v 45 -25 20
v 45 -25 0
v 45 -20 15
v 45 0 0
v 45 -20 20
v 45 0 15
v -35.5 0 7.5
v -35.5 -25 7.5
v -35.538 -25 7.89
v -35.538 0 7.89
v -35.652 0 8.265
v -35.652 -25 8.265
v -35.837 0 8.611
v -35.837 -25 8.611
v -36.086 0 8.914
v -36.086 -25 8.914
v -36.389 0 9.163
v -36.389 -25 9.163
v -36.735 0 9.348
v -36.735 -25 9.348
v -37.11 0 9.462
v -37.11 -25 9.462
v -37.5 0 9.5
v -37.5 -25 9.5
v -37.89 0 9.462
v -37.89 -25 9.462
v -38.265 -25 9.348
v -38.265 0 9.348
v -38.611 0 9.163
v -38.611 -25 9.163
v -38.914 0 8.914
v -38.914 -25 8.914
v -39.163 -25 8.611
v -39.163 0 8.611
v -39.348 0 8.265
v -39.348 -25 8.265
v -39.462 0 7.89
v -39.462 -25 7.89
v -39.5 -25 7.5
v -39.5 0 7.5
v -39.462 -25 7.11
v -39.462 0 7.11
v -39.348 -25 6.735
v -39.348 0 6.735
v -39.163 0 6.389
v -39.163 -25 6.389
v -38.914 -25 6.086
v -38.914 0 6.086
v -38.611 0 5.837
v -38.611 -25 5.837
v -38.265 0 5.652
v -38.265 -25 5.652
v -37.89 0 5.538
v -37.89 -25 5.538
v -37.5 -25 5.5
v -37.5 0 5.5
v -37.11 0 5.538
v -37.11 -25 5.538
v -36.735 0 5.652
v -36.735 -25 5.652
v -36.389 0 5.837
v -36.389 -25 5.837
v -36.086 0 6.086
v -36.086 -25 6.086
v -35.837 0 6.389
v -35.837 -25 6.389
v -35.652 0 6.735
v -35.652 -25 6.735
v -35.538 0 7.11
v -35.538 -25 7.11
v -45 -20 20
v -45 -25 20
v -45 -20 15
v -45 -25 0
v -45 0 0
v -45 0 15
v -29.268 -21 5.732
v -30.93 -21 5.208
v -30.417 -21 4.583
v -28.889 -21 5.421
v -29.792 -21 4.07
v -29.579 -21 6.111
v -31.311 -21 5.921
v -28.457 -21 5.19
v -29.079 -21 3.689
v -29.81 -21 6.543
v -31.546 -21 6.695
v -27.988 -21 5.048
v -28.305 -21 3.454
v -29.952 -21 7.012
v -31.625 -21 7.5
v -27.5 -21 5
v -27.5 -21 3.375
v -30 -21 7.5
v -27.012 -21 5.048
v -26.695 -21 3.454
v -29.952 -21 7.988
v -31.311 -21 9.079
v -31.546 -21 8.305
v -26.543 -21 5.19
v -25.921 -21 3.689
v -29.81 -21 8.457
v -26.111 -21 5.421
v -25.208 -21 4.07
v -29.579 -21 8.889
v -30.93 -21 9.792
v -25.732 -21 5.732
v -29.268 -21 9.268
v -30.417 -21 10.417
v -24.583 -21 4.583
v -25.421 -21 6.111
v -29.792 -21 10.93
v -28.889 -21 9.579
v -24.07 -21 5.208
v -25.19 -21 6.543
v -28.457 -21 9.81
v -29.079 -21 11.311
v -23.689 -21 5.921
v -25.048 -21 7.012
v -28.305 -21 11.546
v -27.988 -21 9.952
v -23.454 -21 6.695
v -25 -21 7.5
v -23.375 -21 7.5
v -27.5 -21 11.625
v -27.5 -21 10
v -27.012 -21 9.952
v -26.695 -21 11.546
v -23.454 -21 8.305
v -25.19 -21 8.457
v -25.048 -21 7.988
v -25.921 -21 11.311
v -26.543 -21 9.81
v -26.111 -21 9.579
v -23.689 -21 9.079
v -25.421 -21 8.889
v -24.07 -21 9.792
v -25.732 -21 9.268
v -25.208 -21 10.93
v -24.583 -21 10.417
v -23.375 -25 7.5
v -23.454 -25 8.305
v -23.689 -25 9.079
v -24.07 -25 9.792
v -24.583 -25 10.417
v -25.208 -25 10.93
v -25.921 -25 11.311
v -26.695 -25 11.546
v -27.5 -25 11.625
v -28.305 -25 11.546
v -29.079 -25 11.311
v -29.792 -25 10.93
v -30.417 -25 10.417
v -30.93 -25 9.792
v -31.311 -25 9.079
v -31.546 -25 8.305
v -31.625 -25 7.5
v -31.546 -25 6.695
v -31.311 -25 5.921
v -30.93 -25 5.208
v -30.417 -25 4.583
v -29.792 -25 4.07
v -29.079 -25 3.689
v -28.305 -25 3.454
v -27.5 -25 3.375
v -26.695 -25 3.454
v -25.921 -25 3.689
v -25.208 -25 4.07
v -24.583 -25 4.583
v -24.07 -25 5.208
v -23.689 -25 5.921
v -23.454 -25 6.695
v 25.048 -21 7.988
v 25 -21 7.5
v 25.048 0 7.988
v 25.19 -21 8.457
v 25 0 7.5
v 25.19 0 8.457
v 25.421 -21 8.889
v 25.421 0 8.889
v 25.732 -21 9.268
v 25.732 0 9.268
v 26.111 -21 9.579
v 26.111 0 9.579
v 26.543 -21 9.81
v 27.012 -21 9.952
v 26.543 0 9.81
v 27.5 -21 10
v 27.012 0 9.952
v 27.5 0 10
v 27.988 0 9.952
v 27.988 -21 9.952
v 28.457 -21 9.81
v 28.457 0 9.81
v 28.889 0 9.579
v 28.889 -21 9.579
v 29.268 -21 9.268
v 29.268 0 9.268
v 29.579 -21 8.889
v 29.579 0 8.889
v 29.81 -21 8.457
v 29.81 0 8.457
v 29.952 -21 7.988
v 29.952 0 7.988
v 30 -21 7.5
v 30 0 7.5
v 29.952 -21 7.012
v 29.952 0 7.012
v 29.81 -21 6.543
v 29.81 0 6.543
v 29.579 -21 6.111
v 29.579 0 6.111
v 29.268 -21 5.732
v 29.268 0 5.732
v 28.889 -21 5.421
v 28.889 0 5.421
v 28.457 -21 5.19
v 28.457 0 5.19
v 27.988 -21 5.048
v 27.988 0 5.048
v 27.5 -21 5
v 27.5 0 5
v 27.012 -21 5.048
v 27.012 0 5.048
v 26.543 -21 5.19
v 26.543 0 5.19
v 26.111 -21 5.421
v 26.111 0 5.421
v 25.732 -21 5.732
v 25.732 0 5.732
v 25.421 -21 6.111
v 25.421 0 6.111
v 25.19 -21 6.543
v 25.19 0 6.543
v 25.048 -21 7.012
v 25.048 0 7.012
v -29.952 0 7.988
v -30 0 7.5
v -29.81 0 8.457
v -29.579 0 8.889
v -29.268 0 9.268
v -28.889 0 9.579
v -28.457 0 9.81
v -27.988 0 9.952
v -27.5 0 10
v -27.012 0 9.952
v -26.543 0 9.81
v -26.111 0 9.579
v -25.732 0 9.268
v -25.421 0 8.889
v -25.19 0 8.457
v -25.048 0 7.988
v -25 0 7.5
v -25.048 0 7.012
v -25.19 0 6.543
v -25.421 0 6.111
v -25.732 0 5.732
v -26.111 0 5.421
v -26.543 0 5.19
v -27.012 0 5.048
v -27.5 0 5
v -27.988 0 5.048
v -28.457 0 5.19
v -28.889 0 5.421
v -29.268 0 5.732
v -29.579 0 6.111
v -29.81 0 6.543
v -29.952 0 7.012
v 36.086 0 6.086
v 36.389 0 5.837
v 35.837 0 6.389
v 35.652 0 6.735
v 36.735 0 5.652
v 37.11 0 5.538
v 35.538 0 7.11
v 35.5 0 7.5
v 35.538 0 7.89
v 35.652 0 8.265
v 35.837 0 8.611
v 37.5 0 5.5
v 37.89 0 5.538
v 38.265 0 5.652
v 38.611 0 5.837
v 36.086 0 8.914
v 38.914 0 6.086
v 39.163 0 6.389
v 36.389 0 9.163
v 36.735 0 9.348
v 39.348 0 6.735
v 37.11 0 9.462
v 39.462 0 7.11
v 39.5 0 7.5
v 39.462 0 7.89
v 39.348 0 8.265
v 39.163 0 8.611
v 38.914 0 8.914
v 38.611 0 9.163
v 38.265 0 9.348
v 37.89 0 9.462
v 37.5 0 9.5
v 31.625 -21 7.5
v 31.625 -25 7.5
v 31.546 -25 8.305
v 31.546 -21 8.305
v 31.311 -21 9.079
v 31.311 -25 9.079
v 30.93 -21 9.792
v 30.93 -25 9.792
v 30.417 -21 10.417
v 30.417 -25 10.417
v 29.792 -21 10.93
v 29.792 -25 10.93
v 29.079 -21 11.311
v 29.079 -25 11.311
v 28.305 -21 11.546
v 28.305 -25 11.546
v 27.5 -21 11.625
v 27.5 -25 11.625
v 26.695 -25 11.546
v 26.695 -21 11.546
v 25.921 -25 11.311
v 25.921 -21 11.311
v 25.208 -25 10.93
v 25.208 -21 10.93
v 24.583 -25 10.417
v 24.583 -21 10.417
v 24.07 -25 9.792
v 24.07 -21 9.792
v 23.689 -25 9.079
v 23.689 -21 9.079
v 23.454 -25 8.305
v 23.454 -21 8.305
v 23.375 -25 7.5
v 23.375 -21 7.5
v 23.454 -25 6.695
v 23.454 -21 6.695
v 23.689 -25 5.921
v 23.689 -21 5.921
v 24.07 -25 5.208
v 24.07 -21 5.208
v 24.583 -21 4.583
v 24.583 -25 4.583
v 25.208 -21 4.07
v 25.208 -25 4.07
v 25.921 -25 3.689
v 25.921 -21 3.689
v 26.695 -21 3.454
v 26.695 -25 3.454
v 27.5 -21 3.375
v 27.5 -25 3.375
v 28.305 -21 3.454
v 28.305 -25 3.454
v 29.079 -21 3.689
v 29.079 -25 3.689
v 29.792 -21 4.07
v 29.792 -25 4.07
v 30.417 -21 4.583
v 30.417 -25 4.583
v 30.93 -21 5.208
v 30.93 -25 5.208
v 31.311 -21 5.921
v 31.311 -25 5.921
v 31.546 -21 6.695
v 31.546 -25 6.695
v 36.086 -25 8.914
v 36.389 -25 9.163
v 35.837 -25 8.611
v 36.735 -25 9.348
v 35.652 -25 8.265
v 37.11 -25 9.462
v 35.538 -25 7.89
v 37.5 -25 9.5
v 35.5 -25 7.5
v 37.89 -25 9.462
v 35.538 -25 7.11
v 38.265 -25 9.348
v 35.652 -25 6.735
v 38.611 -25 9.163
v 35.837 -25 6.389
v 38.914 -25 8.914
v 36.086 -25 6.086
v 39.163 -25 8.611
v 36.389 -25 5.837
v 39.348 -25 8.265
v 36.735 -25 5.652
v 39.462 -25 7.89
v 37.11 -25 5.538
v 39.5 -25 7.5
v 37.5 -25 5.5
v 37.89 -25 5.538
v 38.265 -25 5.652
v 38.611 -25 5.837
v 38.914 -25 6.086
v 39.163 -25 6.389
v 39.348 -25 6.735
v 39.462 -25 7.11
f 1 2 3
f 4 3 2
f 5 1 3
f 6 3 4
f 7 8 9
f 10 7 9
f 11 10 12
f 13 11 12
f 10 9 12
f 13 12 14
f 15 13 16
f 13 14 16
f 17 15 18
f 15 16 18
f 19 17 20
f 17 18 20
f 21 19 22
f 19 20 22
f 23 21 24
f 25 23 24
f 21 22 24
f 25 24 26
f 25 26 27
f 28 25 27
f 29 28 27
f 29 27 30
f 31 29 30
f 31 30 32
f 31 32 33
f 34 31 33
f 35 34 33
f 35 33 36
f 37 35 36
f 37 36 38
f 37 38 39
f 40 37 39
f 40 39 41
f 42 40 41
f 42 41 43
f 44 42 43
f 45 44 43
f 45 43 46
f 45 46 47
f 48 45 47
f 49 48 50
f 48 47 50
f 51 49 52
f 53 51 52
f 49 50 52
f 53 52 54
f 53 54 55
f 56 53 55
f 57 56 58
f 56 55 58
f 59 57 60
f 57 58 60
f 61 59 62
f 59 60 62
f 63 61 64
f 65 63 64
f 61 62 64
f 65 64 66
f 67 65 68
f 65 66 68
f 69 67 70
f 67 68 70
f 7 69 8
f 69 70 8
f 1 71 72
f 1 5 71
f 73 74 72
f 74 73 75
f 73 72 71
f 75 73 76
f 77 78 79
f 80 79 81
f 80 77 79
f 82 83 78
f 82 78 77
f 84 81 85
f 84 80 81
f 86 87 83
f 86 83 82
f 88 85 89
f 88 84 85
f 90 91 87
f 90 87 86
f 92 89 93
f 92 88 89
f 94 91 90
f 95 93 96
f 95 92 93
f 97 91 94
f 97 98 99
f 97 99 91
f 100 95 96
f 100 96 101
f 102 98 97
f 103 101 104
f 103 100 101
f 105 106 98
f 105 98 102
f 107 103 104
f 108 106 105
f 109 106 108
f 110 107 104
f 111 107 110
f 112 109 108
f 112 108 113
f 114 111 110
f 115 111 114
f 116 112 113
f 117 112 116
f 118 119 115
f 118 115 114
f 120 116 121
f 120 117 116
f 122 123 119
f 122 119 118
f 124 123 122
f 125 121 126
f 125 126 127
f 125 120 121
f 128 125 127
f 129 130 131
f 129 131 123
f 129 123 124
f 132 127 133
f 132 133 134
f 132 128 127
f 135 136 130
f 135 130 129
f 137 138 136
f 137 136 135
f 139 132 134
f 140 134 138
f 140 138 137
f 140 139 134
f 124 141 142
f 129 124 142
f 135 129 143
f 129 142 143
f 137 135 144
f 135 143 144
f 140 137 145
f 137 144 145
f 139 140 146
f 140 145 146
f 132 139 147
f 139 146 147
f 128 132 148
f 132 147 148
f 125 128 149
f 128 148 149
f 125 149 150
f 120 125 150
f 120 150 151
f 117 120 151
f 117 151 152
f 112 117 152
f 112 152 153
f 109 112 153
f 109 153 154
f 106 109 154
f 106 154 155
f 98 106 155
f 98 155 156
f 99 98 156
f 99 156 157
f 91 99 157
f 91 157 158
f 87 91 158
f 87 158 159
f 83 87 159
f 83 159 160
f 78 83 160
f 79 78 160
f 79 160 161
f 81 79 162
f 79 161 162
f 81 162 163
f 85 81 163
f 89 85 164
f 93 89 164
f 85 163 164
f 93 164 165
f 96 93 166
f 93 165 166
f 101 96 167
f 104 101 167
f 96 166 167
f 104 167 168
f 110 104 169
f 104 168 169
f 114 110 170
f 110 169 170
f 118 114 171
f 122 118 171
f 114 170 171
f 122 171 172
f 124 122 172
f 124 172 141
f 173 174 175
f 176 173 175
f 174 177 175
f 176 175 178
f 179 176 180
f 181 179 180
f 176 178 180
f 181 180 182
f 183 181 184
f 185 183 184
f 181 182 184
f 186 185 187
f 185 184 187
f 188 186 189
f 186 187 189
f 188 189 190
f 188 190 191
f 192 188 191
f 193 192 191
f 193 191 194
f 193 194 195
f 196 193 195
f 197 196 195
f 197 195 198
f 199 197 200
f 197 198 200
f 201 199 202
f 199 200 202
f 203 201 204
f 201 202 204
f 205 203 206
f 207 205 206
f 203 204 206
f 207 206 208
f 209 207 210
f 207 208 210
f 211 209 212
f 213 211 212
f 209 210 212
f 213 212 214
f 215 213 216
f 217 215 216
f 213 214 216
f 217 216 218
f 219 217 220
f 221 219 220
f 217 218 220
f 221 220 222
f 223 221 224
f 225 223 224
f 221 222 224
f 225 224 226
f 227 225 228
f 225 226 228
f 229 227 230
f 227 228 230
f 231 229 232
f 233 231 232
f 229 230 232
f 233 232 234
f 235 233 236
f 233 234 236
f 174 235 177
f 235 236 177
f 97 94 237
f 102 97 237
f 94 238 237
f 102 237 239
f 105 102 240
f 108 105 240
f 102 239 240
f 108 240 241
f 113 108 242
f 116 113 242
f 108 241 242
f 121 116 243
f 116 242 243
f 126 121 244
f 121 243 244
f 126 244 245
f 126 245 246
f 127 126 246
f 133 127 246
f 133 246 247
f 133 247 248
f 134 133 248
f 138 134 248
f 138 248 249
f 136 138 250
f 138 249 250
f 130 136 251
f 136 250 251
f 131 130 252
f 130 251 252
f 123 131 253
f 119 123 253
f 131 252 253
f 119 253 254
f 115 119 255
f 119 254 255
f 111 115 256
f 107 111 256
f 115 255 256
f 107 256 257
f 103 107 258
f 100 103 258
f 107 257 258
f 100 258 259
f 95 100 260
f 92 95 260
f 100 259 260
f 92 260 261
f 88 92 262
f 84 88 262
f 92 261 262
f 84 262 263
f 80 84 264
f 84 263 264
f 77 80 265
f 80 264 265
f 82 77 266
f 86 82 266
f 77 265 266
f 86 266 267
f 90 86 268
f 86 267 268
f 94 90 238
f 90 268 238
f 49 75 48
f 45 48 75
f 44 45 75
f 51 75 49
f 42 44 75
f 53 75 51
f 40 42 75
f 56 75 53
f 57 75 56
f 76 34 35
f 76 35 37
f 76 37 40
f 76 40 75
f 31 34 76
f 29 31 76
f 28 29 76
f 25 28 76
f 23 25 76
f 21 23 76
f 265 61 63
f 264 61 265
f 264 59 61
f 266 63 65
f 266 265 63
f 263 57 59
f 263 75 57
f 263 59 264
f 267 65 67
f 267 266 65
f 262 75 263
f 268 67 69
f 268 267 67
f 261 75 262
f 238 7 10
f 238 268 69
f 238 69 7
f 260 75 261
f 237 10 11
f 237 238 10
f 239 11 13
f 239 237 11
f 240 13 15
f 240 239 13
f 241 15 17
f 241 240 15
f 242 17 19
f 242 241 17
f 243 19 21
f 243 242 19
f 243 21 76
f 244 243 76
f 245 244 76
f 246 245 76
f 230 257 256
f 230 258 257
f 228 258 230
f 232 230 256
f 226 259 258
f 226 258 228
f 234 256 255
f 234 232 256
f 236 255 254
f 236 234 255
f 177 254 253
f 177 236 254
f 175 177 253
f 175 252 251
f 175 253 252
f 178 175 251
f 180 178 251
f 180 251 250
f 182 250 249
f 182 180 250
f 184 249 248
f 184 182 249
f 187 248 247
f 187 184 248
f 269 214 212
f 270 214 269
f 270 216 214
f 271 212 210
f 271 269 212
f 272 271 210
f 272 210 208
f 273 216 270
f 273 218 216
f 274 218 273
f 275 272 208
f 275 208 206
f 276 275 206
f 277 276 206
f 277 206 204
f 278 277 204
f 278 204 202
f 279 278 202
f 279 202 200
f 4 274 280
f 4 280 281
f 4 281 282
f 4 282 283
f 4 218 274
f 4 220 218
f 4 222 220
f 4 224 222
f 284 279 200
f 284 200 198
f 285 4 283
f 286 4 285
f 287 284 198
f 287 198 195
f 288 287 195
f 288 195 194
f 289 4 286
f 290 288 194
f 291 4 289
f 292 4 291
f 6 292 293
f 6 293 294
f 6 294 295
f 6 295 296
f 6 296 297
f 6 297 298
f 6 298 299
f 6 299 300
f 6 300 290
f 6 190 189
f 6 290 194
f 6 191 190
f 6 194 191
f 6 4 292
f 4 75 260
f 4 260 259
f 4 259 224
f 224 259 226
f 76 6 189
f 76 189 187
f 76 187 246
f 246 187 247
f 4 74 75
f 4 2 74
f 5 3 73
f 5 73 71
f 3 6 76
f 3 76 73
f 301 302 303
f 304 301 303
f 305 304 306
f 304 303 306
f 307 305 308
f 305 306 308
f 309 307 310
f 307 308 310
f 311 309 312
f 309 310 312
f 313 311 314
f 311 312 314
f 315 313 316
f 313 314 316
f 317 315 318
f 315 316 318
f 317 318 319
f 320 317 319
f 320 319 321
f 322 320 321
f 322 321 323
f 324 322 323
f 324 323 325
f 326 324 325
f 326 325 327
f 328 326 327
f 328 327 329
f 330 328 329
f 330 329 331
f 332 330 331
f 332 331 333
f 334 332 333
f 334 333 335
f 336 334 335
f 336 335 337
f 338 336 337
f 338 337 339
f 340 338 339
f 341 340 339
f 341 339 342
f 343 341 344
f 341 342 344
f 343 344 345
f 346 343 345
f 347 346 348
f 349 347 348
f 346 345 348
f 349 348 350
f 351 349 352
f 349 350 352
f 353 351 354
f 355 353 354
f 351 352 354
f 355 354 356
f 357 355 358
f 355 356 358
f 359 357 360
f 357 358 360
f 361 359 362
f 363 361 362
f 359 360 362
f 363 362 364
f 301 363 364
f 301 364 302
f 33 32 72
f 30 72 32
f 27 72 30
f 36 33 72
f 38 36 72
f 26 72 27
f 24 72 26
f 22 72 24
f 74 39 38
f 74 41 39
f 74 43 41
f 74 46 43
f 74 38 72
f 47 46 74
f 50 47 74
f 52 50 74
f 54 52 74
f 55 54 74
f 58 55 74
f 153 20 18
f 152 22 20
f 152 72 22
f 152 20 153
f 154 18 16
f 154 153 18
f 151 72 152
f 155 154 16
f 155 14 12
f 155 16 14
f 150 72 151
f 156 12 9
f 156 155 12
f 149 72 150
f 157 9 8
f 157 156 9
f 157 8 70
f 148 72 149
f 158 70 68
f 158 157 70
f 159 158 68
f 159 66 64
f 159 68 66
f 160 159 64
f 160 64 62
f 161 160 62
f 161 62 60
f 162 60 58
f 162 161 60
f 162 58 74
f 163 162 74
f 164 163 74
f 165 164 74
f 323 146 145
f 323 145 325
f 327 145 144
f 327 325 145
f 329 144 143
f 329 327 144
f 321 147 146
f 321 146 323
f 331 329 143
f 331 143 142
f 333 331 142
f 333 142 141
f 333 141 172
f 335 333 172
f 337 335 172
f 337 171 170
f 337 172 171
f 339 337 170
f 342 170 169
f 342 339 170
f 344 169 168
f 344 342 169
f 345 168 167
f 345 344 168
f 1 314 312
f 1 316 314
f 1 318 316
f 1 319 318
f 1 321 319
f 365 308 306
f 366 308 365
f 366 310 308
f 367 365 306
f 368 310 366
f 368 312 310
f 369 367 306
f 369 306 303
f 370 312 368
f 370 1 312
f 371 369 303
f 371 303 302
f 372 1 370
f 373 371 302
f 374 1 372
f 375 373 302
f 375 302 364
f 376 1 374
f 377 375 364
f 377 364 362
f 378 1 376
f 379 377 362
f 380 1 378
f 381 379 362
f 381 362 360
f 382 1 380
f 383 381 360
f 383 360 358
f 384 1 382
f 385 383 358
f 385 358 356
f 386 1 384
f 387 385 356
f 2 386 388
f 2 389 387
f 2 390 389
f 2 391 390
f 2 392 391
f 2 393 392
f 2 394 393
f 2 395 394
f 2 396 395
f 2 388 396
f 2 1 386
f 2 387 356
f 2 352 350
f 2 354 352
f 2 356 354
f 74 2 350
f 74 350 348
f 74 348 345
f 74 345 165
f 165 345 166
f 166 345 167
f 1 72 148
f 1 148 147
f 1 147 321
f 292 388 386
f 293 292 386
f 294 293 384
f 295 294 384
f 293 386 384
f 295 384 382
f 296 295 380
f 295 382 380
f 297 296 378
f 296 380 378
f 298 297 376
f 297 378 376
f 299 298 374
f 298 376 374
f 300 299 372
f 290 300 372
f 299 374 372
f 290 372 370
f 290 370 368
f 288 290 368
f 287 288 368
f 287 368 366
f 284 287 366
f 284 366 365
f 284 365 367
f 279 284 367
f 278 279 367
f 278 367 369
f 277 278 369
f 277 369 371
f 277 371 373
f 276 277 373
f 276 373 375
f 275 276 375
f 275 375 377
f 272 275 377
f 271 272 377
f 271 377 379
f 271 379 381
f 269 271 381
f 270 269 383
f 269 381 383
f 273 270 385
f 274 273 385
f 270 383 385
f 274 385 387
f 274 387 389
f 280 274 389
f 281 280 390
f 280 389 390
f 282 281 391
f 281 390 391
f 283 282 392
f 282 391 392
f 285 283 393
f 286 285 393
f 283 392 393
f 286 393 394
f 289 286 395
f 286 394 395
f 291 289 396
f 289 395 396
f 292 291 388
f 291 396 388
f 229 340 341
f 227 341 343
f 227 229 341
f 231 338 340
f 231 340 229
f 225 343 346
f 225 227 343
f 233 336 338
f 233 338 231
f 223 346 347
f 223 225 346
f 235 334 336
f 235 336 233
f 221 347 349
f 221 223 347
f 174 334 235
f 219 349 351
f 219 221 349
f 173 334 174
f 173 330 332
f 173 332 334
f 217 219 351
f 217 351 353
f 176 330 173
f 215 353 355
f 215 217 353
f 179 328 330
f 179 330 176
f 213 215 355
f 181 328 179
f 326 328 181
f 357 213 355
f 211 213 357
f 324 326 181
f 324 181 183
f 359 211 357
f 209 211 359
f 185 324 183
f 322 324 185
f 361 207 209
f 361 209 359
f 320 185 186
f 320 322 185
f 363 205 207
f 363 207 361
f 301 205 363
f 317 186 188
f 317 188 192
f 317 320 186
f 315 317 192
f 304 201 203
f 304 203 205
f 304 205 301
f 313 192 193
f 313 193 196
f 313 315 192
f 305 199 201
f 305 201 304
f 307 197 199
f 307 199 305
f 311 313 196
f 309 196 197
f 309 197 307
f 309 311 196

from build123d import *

# Parameters (mm, degrees)
F1_DEPTH       = 45
F2_R           = 2
F3_DEPTH       = 25.001
F4_D           = 5
F4_CBORE_D     = 8.25
F4_CBORE_DEPTH = 4


with BuildPart() as f1:
    # F0 (on Right) → F1 (new body, symmetric)
    with BuildSketch(Plane.YZ):
        Polygon((-25, 0), (0, 0), (0, 15), (-20, 15), (-20, 20), (-25, 20), align=None)
    extrude(amount=F1_DEPTH, both=True)

    # F2 (on face) → F3 (cut, through all)
    with BuildSketch(Plane.XZ.offset(25)):
        with Locations((-37.5, 7.5)):
            Circle(F2_R)
        with Locations((37.5, 7.5)):
            Circle(F2_R)
    extrude(amount=-F3_DEPTH, mode=Mode.SUBTRACT)

    # F4 (through all)
    with Locations(Plane.XZ.offset(25)):
        with Locations((-27.5, 7.5), (27.5, 7.5)):
            CounterBoreHole(F4_D / 2, F4_CBORE_D / 2, F4_CBORE_DEPTH)


solid = f1.part
